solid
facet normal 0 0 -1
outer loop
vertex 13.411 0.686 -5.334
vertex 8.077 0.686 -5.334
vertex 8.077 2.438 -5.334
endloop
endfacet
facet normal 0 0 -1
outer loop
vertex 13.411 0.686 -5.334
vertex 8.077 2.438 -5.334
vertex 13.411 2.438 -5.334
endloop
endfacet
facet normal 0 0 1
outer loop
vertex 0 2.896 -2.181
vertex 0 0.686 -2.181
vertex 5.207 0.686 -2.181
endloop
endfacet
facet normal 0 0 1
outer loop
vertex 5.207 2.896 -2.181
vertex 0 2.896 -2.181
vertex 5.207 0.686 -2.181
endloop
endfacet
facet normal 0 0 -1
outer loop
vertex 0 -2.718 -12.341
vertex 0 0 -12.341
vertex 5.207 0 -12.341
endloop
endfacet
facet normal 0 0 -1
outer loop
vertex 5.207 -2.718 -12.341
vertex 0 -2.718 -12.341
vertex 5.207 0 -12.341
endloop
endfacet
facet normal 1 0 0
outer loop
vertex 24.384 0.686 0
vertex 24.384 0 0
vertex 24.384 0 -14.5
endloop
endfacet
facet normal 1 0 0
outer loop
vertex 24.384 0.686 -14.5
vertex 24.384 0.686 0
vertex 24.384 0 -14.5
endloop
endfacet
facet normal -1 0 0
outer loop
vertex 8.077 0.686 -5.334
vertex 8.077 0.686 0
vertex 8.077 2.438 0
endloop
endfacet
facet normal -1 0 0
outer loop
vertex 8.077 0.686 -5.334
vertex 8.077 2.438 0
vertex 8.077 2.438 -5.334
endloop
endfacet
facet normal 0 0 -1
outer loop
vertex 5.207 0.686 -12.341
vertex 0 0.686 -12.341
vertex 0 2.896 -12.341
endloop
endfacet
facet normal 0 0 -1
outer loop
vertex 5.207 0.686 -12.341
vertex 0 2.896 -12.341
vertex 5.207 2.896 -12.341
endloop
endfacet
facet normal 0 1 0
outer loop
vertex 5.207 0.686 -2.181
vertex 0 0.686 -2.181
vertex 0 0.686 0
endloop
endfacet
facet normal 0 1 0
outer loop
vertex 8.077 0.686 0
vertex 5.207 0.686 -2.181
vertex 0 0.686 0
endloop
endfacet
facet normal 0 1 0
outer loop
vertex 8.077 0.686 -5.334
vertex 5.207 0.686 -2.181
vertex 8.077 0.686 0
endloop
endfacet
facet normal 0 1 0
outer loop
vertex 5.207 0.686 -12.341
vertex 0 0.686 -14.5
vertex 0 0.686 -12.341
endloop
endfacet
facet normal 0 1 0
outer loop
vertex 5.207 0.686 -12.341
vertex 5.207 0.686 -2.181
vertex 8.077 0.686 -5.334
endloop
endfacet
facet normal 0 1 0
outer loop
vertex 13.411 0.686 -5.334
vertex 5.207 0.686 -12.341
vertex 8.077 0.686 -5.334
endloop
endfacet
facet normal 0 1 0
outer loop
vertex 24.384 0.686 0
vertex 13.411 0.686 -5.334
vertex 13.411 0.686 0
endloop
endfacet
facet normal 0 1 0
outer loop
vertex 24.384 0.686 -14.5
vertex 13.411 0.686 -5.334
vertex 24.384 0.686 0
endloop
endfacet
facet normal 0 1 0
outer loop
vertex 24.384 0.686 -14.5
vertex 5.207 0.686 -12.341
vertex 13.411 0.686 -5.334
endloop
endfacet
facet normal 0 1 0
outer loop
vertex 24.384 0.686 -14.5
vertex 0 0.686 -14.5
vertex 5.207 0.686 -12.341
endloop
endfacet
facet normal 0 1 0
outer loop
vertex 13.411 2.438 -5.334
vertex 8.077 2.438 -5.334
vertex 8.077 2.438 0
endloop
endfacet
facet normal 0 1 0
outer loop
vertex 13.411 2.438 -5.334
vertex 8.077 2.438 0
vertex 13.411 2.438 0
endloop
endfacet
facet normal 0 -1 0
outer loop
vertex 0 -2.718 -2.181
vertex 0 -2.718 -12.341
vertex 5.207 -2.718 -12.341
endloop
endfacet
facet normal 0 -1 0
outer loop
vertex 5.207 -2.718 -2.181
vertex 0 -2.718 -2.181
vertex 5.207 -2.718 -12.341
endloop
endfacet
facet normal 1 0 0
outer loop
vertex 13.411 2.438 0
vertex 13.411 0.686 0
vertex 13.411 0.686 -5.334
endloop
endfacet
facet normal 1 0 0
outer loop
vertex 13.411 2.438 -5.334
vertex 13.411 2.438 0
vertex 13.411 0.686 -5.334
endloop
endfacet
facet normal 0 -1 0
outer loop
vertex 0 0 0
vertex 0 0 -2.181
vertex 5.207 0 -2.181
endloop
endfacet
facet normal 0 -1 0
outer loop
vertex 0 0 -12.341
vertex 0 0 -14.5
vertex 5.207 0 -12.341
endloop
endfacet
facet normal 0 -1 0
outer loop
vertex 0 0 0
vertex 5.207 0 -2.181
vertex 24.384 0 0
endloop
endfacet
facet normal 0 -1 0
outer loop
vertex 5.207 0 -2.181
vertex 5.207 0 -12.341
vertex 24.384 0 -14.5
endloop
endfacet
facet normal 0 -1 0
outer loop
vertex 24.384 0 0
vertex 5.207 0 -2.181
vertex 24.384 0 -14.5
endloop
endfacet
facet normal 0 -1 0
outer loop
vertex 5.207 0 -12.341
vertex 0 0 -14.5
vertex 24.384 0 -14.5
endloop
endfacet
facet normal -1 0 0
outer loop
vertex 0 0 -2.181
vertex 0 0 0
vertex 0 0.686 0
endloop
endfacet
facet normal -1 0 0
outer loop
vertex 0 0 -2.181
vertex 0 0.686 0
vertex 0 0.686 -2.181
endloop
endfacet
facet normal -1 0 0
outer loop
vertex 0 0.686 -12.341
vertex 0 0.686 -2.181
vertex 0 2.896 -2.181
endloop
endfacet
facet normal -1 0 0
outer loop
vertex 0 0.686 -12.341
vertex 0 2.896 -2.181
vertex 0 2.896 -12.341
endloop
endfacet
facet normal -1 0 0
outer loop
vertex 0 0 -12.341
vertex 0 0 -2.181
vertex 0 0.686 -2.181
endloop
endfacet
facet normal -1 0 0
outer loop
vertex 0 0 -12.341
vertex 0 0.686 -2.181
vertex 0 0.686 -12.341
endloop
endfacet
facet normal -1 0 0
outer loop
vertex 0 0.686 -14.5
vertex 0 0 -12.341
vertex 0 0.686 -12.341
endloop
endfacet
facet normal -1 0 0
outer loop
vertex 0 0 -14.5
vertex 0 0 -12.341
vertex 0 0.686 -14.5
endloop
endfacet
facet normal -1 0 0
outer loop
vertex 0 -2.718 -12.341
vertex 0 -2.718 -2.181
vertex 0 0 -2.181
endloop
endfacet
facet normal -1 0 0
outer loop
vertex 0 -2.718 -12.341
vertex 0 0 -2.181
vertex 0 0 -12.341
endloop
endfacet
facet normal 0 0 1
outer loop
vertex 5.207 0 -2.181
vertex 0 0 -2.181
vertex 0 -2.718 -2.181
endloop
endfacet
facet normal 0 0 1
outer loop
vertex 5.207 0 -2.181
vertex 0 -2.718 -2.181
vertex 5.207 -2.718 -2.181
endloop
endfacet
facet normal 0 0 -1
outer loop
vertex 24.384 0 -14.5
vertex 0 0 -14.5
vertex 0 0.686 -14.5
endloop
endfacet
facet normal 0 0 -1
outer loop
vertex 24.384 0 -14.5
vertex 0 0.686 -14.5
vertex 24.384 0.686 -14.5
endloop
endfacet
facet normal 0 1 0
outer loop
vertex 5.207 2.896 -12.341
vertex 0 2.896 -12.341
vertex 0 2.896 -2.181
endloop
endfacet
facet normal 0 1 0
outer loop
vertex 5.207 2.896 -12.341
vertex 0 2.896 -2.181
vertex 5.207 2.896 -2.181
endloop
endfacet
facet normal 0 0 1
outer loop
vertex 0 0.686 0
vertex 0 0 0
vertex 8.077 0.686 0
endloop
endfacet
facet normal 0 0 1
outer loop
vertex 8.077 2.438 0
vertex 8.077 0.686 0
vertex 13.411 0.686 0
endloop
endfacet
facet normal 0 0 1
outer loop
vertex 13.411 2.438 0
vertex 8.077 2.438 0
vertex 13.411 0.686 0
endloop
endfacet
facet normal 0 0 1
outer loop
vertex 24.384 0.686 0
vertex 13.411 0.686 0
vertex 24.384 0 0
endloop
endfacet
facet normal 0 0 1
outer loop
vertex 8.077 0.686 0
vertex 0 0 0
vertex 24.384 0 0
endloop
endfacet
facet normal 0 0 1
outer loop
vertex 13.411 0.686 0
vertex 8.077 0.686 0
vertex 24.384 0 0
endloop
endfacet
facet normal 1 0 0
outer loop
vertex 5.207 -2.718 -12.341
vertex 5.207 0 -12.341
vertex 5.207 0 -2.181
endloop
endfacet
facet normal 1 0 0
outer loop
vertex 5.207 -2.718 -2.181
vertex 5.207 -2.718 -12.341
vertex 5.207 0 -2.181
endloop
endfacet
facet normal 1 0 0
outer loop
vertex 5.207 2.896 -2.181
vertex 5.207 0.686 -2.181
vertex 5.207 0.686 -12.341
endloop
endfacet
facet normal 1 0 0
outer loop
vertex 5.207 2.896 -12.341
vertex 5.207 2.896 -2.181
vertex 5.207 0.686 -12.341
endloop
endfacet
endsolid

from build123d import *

# Parameters (mm, degrees)
SKETCH1_W           = 24.384
SKETCH1_H           = 14.5
BOSS_EXTRUDE1_DEPTH = 0.6858
SKETCH2_W           = 5.207
SKETCH2_H           = 10.16
BOSS_EXTRUDE2_DEPTH = 2.2098
SKETCH3_W           = 5.207
SKETCH3_H           = 10.16
BOSS_EXTRUDE3_DEPTH = 2.7178
SKETCH4_W           = 5.334
SKETCH4_H           = 5.334
BOSS_EXTRUDE4_DEPTH = 1.7526


with BuildPart() as part:
    # Sketch1 → Boss-Extrude1 (new body)
    with BuildSketch(Plane(origin=(0, 0, 0), x_dir=(1, 0, 0), z_dir=(0, 1, 0))):
        with Locations((12.192, 7.25)):
            Rectangle(SKETCH1_W, SKETCH1_H)
    extrude(amount=BOSS_EXTRUDE1_DEPTH)

    # Sketch2 → Boss-Extrude2 (add)
    with BuildSketch(Plane(origin=(0, 0.6858, 0), x_dir=(1, 0, 0), z_dir=(0, 1, 0))):
        with Locations((2.6035, 7.261)):
            Rectangle(SKETCH2_W, SKETCH2_H)
    extrude(amount=BOSS_EXTRUDE2_DEPTH)

    # Sketch3 → Boss-Extrude3 (add)
    with BuildSketch(Plane.XZ):
        with Locations((2.6035, -7.261)):
            Rectangle(SKETCH3_W, SKETCH3_H)
    extrude(amount=BOSS_EXTRUDE3_DEPTH)

    # Sketch4 → Boss-Extrude4 (add)
    with BuildSketch(Plane(origin=(0, 0.6858, 0), x_dir=(1, 0, 0), z_dir=(0, 1, 0))):
        with Locations((10.7442, 2.667)):
            Rectangle(SKETCH4_W, SKETCH4_H)
    extrude(amount=BOSS_EXTRUDE4_DEPTH)


solid = part.part
